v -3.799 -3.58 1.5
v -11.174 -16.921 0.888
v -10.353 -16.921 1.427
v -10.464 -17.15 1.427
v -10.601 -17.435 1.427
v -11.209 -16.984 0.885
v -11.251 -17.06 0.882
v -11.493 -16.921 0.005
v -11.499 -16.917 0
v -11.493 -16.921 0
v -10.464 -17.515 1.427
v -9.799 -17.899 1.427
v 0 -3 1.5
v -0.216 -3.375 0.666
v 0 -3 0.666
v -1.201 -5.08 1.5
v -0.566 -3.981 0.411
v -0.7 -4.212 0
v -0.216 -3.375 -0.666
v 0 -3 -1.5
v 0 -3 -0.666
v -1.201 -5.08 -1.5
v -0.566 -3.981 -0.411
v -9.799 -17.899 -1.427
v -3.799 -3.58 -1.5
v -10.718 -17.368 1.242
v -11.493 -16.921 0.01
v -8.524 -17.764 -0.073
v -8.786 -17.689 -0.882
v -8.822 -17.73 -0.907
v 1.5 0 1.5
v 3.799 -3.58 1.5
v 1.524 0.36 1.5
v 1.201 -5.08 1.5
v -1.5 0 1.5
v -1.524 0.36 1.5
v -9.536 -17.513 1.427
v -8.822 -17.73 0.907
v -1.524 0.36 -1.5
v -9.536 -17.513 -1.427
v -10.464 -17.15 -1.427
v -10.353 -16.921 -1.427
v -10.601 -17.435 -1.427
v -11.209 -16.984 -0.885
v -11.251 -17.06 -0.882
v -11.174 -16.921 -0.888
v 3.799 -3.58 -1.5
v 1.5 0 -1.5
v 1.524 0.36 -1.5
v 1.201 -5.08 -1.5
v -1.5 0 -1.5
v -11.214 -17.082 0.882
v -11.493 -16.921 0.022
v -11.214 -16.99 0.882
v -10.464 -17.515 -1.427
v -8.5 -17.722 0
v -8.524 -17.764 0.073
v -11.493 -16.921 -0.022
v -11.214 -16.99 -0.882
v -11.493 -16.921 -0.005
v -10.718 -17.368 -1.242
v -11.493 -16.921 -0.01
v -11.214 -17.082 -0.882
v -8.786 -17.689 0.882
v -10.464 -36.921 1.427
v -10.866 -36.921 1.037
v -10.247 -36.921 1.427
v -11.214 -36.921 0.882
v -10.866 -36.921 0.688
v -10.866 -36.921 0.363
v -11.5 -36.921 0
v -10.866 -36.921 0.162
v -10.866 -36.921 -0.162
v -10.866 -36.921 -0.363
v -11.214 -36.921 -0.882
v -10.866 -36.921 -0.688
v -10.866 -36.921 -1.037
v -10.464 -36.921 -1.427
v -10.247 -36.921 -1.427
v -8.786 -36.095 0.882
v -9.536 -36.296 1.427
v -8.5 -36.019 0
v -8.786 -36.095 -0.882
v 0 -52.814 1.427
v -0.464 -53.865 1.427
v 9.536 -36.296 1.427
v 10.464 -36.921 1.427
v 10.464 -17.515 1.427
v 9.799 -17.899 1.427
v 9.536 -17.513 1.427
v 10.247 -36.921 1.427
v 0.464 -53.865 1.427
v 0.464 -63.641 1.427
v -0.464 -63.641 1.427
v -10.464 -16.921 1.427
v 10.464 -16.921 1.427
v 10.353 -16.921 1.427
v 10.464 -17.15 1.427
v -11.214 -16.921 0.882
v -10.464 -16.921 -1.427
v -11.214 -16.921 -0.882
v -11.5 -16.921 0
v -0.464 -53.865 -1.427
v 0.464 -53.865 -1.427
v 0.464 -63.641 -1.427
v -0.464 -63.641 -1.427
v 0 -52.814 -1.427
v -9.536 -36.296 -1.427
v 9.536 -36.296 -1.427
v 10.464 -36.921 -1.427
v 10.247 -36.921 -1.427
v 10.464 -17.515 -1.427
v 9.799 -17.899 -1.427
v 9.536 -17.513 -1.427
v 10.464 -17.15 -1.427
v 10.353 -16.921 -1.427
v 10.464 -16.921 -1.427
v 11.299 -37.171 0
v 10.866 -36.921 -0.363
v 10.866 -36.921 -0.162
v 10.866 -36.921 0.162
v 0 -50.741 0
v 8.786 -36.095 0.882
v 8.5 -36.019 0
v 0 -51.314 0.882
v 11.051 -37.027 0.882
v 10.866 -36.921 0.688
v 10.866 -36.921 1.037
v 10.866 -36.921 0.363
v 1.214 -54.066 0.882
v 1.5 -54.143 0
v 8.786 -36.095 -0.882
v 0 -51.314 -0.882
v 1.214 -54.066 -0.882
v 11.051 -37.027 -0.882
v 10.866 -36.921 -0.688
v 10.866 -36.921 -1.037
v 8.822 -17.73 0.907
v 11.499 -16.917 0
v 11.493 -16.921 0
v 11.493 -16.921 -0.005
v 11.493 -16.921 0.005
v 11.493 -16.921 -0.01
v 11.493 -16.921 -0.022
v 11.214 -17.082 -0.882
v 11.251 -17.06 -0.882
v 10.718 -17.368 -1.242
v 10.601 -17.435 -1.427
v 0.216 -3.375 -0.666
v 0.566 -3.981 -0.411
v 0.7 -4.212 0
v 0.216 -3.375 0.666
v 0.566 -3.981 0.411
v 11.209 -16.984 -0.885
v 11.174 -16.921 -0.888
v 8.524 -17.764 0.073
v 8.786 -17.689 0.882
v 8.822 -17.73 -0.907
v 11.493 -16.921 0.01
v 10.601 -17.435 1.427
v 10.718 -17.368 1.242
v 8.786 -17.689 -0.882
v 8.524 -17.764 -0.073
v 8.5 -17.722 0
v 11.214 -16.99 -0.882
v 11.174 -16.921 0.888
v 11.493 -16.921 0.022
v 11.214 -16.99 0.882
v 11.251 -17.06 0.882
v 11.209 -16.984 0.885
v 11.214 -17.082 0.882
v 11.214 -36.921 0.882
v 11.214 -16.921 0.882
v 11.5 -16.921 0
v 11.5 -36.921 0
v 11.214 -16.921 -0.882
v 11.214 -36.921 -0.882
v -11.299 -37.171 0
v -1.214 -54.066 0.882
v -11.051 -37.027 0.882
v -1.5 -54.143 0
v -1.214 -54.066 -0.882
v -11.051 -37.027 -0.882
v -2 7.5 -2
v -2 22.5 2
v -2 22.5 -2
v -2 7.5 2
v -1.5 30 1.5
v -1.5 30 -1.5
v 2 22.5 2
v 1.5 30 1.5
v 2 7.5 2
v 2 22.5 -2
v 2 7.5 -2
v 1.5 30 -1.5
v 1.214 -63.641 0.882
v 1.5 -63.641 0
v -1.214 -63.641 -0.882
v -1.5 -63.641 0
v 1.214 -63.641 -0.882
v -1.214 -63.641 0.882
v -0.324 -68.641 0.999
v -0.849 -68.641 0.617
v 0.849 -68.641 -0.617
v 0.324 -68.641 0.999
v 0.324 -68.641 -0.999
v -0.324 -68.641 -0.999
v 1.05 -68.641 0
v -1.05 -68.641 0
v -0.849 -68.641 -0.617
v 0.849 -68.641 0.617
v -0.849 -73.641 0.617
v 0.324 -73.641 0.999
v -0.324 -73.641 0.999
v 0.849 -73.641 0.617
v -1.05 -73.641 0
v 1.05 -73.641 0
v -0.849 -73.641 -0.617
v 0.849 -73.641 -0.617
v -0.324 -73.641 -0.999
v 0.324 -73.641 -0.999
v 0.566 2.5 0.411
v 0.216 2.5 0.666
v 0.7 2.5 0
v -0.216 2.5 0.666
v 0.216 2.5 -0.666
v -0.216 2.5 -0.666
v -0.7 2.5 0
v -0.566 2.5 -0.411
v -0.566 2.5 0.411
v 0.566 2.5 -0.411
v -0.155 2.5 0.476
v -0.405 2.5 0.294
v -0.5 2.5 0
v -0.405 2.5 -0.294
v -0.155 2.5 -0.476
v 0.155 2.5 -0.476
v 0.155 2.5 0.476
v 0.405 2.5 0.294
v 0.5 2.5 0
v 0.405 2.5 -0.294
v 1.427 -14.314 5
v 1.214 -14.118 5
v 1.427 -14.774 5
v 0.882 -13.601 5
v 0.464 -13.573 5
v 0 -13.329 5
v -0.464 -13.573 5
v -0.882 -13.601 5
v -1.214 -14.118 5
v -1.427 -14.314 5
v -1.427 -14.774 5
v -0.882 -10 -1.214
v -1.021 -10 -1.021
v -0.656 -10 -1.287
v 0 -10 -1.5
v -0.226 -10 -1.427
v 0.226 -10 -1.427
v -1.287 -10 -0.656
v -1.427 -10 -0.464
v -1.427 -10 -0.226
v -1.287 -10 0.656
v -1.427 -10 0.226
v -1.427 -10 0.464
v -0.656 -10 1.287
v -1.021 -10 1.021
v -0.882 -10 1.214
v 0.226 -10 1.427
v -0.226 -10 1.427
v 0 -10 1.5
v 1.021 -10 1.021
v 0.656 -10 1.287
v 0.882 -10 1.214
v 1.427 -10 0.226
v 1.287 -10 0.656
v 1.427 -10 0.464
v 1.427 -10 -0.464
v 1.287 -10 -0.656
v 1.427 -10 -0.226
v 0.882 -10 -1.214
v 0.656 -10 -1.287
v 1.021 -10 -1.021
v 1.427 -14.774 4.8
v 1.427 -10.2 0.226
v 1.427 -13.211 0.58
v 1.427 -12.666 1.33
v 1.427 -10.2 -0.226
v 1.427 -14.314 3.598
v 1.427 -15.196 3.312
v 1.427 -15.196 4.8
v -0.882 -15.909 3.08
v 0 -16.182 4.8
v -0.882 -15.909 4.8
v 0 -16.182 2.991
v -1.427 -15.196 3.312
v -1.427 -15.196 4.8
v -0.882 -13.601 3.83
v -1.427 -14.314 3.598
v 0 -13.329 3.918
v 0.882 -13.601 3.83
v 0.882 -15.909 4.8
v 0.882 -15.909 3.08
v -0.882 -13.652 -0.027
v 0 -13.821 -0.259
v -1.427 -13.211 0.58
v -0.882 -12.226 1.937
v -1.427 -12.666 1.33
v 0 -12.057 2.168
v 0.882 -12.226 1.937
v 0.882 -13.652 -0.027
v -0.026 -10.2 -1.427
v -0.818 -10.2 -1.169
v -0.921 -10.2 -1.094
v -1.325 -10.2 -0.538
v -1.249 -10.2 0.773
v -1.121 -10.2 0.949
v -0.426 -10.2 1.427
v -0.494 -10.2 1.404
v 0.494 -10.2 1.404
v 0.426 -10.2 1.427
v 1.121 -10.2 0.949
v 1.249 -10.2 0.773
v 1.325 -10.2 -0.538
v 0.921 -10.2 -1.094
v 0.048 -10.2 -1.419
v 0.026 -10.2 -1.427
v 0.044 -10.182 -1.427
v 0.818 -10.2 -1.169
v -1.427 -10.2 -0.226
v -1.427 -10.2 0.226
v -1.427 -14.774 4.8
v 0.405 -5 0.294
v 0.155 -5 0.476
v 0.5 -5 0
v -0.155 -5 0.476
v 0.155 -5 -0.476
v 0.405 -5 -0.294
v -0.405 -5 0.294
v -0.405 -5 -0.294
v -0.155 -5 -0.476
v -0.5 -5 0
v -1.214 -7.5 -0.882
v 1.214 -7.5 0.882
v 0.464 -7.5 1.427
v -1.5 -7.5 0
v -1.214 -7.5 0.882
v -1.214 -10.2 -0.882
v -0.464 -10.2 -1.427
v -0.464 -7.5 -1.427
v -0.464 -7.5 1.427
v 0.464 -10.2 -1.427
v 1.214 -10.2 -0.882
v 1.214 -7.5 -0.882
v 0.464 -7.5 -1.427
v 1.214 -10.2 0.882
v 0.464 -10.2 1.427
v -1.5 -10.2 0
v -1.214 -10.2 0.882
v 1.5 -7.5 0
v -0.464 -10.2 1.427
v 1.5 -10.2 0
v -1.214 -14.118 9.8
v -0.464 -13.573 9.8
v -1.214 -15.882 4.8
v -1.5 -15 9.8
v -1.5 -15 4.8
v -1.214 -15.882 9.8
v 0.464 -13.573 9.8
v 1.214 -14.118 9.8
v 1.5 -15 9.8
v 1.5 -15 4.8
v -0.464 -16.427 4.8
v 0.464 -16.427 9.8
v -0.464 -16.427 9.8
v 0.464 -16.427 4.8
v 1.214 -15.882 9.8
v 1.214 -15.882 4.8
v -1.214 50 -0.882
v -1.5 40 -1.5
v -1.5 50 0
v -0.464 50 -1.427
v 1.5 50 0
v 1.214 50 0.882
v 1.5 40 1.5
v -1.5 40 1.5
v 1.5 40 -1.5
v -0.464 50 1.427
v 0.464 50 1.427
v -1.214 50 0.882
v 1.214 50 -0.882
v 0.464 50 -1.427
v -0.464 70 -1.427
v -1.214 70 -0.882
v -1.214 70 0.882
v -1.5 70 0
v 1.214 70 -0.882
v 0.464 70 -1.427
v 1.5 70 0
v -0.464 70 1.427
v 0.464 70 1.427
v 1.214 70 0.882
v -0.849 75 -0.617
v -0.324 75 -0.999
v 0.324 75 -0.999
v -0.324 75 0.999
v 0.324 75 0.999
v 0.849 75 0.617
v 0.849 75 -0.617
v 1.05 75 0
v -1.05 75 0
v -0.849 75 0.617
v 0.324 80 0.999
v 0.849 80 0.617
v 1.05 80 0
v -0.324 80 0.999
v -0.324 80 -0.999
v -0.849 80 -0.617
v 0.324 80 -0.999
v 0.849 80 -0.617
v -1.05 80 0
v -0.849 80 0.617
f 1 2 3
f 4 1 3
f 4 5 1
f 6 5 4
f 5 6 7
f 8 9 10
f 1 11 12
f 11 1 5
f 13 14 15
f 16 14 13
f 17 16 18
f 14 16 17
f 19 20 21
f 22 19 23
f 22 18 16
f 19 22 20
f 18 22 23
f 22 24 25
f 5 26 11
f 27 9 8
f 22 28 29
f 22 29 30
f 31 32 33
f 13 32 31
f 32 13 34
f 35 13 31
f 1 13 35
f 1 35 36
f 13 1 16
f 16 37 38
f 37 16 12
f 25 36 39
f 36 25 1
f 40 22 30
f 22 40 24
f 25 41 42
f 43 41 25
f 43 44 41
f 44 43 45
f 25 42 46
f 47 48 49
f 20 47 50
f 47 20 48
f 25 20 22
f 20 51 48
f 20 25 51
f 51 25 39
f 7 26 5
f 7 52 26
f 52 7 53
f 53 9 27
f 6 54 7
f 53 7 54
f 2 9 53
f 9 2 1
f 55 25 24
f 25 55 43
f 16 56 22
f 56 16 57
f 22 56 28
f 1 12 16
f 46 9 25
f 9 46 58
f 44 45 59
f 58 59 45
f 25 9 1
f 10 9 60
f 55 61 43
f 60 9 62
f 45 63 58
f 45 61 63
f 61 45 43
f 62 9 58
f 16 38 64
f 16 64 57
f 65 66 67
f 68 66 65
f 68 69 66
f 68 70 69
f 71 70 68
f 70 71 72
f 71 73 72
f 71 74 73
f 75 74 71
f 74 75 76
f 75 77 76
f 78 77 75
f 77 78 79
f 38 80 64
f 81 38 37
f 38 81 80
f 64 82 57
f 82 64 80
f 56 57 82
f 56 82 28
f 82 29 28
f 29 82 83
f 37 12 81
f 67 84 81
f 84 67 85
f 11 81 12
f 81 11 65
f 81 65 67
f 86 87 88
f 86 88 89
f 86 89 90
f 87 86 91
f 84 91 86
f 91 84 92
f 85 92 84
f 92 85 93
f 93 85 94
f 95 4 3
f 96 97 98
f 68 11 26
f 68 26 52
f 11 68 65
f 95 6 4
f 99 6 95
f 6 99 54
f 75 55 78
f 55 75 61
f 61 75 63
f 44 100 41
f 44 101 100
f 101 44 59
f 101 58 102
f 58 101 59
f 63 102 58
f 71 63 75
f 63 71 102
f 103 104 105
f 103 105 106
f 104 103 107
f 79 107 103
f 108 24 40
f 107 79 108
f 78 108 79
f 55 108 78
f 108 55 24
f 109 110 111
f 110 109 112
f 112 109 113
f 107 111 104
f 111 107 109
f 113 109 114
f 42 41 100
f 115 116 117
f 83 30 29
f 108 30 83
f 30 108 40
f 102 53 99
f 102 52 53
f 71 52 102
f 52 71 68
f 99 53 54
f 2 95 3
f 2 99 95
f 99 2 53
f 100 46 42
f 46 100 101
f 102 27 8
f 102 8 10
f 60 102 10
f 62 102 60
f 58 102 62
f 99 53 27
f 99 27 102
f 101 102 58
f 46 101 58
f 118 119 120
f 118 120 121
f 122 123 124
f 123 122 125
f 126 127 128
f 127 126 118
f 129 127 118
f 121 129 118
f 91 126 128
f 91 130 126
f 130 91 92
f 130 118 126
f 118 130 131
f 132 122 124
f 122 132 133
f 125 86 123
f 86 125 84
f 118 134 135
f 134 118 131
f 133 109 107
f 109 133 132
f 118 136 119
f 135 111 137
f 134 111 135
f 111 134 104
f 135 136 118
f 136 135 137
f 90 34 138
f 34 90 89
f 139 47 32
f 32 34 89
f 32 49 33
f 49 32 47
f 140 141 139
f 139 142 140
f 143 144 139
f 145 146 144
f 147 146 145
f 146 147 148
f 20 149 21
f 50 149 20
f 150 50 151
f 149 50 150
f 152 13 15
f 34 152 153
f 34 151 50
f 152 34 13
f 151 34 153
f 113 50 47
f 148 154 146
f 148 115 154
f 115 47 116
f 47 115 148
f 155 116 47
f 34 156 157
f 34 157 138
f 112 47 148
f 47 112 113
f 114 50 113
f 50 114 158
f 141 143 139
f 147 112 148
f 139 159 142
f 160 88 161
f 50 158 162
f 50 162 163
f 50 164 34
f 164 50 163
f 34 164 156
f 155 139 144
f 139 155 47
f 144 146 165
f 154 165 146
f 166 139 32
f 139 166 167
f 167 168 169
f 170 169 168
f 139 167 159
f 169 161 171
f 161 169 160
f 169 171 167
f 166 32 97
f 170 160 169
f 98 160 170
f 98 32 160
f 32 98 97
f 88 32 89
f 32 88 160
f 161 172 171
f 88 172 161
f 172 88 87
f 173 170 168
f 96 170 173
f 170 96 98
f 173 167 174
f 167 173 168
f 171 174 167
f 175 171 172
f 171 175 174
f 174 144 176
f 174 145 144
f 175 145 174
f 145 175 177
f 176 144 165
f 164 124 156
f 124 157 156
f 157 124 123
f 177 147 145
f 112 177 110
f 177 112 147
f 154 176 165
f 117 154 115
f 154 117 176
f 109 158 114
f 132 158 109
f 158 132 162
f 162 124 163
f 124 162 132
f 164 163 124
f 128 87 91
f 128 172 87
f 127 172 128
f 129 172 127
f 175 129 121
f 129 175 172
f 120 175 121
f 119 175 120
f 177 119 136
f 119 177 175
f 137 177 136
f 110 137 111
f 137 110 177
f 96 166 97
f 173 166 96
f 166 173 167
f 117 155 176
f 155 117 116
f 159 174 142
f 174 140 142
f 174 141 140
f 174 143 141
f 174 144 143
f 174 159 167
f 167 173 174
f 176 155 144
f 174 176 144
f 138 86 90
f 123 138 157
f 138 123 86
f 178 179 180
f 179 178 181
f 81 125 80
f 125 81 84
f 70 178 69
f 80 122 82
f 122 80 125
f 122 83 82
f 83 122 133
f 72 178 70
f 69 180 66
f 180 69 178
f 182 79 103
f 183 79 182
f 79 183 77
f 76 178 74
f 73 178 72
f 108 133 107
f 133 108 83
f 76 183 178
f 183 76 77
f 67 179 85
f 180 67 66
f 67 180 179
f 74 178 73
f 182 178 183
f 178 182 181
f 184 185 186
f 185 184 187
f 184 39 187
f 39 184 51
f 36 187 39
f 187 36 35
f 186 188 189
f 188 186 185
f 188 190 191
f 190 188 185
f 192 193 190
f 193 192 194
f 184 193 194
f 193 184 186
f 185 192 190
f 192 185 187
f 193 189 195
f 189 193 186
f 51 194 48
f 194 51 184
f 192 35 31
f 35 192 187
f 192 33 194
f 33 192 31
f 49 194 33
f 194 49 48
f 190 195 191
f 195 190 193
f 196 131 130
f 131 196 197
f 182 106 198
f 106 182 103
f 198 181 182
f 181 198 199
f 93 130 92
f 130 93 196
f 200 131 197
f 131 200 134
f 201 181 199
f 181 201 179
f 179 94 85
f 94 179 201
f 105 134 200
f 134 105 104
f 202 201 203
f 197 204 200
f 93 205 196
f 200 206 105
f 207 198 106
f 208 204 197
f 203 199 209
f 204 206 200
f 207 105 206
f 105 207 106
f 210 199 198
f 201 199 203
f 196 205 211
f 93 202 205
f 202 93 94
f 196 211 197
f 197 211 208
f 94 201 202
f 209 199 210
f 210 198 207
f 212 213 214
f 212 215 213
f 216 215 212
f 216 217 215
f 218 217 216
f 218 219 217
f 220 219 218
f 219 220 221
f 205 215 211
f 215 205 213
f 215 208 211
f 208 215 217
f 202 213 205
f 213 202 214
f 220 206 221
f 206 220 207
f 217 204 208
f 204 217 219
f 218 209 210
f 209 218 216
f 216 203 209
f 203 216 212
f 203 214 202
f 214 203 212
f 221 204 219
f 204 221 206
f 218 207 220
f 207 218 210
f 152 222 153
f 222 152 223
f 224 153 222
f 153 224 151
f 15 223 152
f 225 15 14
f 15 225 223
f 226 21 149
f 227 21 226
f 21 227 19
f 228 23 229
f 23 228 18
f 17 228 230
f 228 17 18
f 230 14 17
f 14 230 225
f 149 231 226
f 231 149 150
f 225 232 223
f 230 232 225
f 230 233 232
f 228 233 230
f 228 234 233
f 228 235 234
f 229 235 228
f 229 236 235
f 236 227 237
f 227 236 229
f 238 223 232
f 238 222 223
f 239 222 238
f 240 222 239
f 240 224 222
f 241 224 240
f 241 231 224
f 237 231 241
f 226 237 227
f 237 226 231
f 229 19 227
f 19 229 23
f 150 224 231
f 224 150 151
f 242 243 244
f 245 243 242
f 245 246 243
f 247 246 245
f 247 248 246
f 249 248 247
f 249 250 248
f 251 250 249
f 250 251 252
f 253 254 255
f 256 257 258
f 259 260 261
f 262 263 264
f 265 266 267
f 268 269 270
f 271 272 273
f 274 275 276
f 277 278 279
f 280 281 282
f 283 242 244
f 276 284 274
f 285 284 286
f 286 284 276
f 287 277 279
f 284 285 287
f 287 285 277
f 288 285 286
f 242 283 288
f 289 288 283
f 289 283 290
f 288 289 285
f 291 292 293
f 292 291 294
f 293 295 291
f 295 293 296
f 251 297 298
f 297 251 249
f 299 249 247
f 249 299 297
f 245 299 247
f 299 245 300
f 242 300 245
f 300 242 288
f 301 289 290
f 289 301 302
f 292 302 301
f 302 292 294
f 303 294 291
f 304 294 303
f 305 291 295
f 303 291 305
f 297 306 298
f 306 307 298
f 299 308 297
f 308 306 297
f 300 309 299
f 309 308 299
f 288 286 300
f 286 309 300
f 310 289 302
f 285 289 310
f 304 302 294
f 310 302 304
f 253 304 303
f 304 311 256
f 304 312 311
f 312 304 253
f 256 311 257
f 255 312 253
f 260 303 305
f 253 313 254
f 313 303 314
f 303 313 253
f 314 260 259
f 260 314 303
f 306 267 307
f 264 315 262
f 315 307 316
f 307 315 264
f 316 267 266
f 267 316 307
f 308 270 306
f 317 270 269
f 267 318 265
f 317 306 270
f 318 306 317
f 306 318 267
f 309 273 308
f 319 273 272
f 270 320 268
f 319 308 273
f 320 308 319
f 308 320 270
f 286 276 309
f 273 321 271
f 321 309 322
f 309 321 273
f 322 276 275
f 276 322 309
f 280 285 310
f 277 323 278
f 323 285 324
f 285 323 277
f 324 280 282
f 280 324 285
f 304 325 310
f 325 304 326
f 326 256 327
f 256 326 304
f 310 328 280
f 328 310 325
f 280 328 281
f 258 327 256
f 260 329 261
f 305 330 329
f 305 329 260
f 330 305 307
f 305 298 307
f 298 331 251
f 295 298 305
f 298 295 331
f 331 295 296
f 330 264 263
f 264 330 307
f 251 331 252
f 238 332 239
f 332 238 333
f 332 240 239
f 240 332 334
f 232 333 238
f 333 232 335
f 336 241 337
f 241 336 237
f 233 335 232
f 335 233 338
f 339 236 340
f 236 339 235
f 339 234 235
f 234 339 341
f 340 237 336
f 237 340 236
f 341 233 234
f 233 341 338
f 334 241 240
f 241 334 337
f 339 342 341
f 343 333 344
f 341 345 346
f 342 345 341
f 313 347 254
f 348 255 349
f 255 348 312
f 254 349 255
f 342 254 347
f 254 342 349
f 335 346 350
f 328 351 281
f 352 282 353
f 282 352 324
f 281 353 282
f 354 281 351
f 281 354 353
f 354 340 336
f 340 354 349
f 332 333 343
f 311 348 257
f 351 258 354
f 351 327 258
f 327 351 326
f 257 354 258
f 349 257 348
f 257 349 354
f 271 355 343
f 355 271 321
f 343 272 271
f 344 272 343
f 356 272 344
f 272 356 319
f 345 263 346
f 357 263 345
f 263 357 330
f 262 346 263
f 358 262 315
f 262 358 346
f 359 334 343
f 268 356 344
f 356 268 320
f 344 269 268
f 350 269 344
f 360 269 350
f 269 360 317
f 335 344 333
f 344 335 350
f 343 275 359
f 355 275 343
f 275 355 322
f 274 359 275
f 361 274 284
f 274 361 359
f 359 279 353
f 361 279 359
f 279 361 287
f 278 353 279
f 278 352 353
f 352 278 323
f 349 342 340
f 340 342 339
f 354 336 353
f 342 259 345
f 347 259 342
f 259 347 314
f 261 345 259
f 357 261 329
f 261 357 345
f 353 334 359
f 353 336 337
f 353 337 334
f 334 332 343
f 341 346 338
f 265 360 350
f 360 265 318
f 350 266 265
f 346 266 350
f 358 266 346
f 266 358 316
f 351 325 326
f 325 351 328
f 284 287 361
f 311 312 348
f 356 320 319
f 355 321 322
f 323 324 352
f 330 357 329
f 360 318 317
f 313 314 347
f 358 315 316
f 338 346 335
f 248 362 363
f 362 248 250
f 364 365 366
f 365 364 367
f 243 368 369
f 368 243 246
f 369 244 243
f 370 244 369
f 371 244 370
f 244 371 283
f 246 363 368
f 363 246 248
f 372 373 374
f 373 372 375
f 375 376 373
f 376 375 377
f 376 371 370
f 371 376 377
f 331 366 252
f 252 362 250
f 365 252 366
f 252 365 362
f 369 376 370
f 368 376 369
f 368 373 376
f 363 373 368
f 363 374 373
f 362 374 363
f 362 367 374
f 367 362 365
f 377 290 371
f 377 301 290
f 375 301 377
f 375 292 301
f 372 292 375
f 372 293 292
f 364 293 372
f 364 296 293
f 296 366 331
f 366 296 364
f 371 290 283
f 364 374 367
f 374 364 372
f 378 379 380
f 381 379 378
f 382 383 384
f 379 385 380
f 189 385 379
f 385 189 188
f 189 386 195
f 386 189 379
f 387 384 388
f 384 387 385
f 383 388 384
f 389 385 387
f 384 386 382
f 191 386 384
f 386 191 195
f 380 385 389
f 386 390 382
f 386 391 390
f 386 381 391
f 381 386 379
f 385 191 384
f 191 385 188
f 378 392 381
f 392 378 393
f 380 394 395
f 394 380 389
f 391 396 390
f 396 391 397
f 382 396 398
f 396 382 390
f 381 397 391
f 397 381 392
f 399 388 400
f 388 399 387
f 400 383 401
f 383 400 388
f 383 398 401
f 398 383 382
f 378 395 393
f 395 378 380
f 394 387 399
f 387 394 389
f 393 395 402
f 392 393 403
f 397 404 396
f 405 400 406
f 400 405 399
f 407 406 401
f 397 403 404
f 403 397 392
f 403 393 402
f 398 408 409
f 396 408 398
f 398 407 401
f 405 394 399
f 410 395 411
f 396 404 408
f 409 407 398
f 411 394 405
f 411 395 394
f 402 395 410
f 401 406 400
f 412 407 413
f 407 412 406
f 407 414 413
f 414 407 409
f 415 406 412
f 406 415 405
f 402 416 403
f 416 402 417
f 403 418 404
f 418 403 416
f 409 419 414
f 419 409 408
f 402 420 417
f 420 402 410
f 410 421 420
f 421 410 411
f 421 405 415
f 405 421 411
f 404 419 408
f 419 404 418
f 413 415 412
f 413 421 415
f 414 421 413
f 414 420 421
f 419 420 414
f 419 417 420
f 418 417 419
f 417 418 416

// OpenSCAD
$fn=10;
l_chan=40;
l_elb=20;
l_bet=20;
l_end=20;
l_conv=20;
l_out=30;
od=2.1;
module Flow_cyt_channel_simpler(l_chan=30, l_elb=20, l_bet=20, l_end=20, l_conv=20, l_out=20, od=2.1){
difference(){
    union (){
        
        //imaging channel
        
    translate ([0,l_chan/2,0]){ 
        hull(){
        cube([4,l_chan/2,4], center= true);
        translate([0,l_chan/4+l_chan/8,0]){
            cube([3,l_chan/4,3], center=true);
        }
        translate ([0,-l_chan/4-l_chan/8,0]){
            cube([3,l_chan/4,3], center=true);
        }
    }
    }
    
        //flow channels leading to the imaging channel
    
    for(x=[-30,30]){
    rotate ([0,0,x]){
        rotate([90,0,0]){
        hull(){
            translate ([0,0,l_elb/8]){
                cube ([3,3,l_elb/4], center    =true);
            }
            translate ([0,0,l_elb/2]){
                cylinder (d=3, h=l_elb/2+0.4);
            }
        }
        }

    }
    if (x<0){
        translate ([-l_elb/2,-l_elb*sqrt(3)/2+0.4,0]){
            rotate ([90,0,0]){
               cylinder (d=3, h=l_bet);
            }
        }
    }
    else{
         translate ([l_elb/2,-l_elb*sqrt(3)/2+0.4,0]){
            rotate ([90,0,0]){
                cylinder (d=3, h=l_bet);
            }
        }
    }
    translate ([0,-l_elb*sqrt(3)+0.9-l_bet,0]){
        rotate([0,0,x+180]){
            rotate ([90,0,0]){
                cylinder (d=3, h=l_elb);
            }
        }
    }
    }
    translate ([0,-l_elb*sqrt(3)-l_bet+1,0]){
        rotate ([90,0,0]){
            cylinder (d=3, h=l_end/4);
        }
    }
    hull(){
        translate ([0,-l_elb*sqrt(3)-l_bet+1-l_end/4,0]){
            rotate ([90,0,0]){
                cylinder (d=3, h=l_end/4);
            }
        }
        translate ([0,-l_elb*sqrt(3)-l_bet+1-l_end/2,0]){
            rotate ([90,0,0]){
                cylinder (d=od, h=l_end/4);
            }
        }
    }
    translate ([0,-l_elb*sqrt(3)-l_bet+1-l_end/2-l_end/4,0]){
        rotate ([90,0,0]){
            cylinder (d=od, h=l_end/4);
            }
        }
    
    
    
}

        //Inlet for the islets

    rotate ([90,0,0]){
        translate([0,0,5]){
        cylinder (d=1.4,h=15, center=true);
        }
    }
}
rotate ([90,0,0]){
    translate([0,0,5]){
        cylinder (d=1,h=15, center=true);
        }
    }
translate ([0,-10,5]){
        rotate([0,90,180]){
        intersection (){
    translate ([0,0,-1.5]){
        cube(10,10,3);
    }
    rotate_extrude(convexity=10)
    translate([5,0,0]){
        circle (r=1.5);
    }
}
}
}
rotate ([90,0,0]){
    hull(){
        translate([0,0,7.5]){
            cylinder (d=3,h=2.7);
        }
        translate([0,0,5]){
            cylinder (d=1,h=2.5);
        }
    }
        
}
translate ([0,-15,4.8]){
    cylinder (d=3, h=5);
}
    
        //channel leading out of image channel
    
hull(){
    translate([0,l_chan+l_conv/4,0]){
        cube([3,l_conv/2,3], center=true);
    }
    translate ([0,l_chan+l_conv/2,0]){
        rotate([-90,0,0]){
            cylinder(d=3,h=l_conv/2);
        }
    }
}
translate ([0,l_chan+l_conv,0]){
    rotate ([-90,0,0]){
        cylinder(d=3,h=l_out);
    }
}
hull(){
        translate ([0,l_chan+l_conv+l_out,0]){
            rotate ([90,0,0]){
                cylinder (d=3, h=l_end/4);
            }
        }
        translate ([0,l_chan+l_conv+l_out+l_end/4,0]){
            rotate ([90,0,0]){
                cylinder (d=od, h=l_end/4);
            }
        }
    }
    translate ([0,l_chan+l_conv+l_out+l_end/2,0]){
        rotate ([90,0,0]){
            cylinder (d=od, h=l_end/2);
            }
        }
}
Flow_cyt_channel_simpler ();
